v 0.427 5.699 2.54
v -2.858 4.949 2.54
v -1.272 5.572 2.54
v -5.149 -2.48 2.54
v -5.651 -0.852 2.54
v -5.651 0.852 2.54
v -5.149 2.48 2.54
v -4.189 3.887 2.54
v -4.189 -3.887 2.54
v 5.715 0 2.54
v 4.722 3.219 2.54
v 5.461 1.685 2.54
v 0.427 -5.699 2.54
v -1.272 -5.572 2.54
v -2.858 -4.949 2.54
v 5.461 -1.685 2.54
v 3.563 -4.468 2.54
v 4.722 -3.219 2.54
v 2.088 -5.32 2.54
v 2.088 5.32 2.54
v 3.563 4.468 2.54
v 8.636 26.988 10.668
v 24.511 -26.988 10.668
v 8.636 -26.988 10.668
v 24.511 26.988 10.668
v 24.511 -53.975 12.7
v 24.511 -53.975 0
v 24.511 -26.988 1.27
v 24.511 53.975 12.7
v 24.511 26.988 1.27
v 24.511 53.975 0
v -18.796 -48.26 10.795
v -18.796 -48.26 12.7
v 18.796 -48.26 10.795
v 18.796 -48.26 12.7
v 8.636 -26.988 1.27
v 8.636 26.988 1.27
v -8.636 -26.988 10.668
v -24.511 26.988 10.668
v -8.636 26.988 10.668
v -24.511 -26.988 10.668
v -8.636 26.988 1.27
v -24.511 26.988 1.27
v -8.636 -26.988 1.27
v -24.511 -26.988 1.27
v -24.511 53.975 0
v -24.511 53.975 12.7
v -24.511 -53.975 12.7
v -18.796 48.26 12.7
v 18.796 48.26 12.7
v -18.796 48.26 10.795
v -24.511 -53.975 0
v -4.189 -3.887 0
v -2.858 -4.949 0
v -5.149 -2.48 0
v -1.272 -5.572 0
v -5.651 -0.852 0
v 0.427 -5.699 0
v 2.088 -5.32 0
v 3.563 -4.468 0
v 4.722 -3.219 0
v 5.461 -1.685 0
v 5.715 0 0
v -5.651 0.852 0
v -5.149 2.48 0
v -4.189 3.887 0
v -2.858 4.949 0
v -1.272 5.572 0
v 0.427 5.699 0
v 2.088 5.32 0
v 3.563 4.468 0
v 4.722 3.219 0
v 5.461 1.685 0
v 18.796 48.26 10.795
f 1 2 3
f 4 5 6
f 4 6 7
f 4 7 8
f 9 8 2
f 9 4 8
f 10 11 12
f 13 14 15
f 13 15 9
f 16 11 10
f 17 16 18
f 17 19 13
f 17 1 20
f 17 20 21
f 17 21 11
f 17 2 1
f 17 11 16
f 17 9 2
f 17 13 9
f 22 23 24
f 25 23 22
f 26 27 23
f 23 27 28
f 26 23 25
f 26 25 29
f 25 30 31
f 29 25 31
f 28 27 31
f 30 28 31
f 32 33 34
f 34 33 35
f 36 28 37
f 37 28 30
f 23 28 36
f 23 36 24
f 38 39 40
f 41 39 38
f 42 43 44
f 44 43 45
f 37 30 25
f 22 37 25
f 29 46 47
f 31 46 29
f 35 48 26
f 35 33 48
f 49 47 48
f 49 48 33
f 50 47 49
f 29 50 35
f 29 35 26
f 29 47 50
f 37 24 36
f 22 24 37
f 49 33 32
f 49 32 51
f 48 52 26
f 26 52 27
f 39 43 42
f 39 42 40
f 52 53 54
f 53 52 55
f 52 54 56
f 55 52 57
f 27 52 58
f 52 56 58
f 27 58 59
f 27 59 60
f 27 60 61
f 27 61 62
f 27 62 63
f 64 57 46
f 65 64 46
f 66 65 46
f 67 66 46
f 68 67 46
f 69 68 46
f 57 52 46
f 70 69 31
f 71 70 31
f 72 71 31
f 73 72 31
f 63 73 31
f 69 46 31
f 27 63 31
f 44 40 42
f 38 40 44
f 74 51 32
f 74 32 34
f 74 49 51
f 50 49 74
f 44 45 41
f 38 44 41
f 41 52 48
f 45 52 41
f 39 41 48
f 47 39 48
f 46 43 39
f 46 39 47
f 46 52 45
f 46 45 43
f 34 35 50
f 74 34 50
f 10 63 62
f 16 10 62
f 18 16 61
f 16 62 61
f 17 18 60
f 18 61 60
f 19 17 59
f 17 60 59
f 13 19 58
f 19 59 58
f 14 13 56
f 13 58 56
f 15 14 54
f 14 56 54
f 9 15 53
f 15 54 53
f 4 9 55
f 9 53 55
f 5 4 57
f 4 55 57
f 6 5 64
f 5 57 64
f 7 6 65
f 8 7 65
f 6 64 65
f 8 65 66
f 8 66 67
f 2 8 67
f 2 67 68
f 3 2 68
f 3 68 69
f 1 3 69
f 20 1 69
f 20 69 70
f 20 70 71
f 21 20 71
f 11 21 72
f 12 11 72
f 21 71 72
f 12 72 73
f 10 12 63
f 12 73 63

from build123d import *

# Parameters (mm, degrees)
F0_W     = 49.022
F0_H     = 107.95
F1_DEPTH = 12.7
F2_R     = 5.715
F3_DEPTH = 2.54
F4_W     = 37.592
F4_H     = 96.52
F5_DEPTH = 1.905
F6_W     = 53.975
F6_H     = 9.398
F7_DEPTH = 15.875
F8_W     = 53.975
F8_H     = 9.398
F9_DEPTH = 15.875


with BuildPart() as f1:
    # F0 (on Top) → F1 (new body)
    with BuildSketch(Plane.XY):
        Rectangle(F0_W, F0_H)
    extrude(amount=F1_DEPTH)

    # F2 (on face) → F3 (cut)
    with BuildSketch(Plane(origin=(0, 0, 0), x_dir=(1, 0, 0), z_dir=(0, 0, -1))):
        Circle(F2_R)
    extrude(amount=-F3_DEPTH, mode=Mode.SUBTRACT)

    # F4 (on face) → F5 (cut)
    with BuildSketch(Plane.XY.offset(12.7)):
        Rectangle(F4_W, F4_H)
    extrude(amount=-F5_DEPTH, mode=Mode.SUBTRACT)

    # F6 (on face) → F7 (cut)
    with BuildSketch(Plane(origin=(-24.511, 0, 0), x_dir=(0, -1, 0), z_dir=(-1, 0, 0))):
        with Locations((0, 5.969)):
            Rectangle(F6_W, F6_H)
    extrude(amount=-F7_DEPTH, mode=Mode.SUBTRACT)

    # F8 (on face) → F9 (cut)
    with BuildSketch(Plane.YZ.offset(24.511)):
        with Locations((0, 5.969)):
            Rectangle(F8_W, F8_H)
    extrude(amount=-F9_DEPTH, mode=Mode.SUBTRACT)


solid = f1.part
